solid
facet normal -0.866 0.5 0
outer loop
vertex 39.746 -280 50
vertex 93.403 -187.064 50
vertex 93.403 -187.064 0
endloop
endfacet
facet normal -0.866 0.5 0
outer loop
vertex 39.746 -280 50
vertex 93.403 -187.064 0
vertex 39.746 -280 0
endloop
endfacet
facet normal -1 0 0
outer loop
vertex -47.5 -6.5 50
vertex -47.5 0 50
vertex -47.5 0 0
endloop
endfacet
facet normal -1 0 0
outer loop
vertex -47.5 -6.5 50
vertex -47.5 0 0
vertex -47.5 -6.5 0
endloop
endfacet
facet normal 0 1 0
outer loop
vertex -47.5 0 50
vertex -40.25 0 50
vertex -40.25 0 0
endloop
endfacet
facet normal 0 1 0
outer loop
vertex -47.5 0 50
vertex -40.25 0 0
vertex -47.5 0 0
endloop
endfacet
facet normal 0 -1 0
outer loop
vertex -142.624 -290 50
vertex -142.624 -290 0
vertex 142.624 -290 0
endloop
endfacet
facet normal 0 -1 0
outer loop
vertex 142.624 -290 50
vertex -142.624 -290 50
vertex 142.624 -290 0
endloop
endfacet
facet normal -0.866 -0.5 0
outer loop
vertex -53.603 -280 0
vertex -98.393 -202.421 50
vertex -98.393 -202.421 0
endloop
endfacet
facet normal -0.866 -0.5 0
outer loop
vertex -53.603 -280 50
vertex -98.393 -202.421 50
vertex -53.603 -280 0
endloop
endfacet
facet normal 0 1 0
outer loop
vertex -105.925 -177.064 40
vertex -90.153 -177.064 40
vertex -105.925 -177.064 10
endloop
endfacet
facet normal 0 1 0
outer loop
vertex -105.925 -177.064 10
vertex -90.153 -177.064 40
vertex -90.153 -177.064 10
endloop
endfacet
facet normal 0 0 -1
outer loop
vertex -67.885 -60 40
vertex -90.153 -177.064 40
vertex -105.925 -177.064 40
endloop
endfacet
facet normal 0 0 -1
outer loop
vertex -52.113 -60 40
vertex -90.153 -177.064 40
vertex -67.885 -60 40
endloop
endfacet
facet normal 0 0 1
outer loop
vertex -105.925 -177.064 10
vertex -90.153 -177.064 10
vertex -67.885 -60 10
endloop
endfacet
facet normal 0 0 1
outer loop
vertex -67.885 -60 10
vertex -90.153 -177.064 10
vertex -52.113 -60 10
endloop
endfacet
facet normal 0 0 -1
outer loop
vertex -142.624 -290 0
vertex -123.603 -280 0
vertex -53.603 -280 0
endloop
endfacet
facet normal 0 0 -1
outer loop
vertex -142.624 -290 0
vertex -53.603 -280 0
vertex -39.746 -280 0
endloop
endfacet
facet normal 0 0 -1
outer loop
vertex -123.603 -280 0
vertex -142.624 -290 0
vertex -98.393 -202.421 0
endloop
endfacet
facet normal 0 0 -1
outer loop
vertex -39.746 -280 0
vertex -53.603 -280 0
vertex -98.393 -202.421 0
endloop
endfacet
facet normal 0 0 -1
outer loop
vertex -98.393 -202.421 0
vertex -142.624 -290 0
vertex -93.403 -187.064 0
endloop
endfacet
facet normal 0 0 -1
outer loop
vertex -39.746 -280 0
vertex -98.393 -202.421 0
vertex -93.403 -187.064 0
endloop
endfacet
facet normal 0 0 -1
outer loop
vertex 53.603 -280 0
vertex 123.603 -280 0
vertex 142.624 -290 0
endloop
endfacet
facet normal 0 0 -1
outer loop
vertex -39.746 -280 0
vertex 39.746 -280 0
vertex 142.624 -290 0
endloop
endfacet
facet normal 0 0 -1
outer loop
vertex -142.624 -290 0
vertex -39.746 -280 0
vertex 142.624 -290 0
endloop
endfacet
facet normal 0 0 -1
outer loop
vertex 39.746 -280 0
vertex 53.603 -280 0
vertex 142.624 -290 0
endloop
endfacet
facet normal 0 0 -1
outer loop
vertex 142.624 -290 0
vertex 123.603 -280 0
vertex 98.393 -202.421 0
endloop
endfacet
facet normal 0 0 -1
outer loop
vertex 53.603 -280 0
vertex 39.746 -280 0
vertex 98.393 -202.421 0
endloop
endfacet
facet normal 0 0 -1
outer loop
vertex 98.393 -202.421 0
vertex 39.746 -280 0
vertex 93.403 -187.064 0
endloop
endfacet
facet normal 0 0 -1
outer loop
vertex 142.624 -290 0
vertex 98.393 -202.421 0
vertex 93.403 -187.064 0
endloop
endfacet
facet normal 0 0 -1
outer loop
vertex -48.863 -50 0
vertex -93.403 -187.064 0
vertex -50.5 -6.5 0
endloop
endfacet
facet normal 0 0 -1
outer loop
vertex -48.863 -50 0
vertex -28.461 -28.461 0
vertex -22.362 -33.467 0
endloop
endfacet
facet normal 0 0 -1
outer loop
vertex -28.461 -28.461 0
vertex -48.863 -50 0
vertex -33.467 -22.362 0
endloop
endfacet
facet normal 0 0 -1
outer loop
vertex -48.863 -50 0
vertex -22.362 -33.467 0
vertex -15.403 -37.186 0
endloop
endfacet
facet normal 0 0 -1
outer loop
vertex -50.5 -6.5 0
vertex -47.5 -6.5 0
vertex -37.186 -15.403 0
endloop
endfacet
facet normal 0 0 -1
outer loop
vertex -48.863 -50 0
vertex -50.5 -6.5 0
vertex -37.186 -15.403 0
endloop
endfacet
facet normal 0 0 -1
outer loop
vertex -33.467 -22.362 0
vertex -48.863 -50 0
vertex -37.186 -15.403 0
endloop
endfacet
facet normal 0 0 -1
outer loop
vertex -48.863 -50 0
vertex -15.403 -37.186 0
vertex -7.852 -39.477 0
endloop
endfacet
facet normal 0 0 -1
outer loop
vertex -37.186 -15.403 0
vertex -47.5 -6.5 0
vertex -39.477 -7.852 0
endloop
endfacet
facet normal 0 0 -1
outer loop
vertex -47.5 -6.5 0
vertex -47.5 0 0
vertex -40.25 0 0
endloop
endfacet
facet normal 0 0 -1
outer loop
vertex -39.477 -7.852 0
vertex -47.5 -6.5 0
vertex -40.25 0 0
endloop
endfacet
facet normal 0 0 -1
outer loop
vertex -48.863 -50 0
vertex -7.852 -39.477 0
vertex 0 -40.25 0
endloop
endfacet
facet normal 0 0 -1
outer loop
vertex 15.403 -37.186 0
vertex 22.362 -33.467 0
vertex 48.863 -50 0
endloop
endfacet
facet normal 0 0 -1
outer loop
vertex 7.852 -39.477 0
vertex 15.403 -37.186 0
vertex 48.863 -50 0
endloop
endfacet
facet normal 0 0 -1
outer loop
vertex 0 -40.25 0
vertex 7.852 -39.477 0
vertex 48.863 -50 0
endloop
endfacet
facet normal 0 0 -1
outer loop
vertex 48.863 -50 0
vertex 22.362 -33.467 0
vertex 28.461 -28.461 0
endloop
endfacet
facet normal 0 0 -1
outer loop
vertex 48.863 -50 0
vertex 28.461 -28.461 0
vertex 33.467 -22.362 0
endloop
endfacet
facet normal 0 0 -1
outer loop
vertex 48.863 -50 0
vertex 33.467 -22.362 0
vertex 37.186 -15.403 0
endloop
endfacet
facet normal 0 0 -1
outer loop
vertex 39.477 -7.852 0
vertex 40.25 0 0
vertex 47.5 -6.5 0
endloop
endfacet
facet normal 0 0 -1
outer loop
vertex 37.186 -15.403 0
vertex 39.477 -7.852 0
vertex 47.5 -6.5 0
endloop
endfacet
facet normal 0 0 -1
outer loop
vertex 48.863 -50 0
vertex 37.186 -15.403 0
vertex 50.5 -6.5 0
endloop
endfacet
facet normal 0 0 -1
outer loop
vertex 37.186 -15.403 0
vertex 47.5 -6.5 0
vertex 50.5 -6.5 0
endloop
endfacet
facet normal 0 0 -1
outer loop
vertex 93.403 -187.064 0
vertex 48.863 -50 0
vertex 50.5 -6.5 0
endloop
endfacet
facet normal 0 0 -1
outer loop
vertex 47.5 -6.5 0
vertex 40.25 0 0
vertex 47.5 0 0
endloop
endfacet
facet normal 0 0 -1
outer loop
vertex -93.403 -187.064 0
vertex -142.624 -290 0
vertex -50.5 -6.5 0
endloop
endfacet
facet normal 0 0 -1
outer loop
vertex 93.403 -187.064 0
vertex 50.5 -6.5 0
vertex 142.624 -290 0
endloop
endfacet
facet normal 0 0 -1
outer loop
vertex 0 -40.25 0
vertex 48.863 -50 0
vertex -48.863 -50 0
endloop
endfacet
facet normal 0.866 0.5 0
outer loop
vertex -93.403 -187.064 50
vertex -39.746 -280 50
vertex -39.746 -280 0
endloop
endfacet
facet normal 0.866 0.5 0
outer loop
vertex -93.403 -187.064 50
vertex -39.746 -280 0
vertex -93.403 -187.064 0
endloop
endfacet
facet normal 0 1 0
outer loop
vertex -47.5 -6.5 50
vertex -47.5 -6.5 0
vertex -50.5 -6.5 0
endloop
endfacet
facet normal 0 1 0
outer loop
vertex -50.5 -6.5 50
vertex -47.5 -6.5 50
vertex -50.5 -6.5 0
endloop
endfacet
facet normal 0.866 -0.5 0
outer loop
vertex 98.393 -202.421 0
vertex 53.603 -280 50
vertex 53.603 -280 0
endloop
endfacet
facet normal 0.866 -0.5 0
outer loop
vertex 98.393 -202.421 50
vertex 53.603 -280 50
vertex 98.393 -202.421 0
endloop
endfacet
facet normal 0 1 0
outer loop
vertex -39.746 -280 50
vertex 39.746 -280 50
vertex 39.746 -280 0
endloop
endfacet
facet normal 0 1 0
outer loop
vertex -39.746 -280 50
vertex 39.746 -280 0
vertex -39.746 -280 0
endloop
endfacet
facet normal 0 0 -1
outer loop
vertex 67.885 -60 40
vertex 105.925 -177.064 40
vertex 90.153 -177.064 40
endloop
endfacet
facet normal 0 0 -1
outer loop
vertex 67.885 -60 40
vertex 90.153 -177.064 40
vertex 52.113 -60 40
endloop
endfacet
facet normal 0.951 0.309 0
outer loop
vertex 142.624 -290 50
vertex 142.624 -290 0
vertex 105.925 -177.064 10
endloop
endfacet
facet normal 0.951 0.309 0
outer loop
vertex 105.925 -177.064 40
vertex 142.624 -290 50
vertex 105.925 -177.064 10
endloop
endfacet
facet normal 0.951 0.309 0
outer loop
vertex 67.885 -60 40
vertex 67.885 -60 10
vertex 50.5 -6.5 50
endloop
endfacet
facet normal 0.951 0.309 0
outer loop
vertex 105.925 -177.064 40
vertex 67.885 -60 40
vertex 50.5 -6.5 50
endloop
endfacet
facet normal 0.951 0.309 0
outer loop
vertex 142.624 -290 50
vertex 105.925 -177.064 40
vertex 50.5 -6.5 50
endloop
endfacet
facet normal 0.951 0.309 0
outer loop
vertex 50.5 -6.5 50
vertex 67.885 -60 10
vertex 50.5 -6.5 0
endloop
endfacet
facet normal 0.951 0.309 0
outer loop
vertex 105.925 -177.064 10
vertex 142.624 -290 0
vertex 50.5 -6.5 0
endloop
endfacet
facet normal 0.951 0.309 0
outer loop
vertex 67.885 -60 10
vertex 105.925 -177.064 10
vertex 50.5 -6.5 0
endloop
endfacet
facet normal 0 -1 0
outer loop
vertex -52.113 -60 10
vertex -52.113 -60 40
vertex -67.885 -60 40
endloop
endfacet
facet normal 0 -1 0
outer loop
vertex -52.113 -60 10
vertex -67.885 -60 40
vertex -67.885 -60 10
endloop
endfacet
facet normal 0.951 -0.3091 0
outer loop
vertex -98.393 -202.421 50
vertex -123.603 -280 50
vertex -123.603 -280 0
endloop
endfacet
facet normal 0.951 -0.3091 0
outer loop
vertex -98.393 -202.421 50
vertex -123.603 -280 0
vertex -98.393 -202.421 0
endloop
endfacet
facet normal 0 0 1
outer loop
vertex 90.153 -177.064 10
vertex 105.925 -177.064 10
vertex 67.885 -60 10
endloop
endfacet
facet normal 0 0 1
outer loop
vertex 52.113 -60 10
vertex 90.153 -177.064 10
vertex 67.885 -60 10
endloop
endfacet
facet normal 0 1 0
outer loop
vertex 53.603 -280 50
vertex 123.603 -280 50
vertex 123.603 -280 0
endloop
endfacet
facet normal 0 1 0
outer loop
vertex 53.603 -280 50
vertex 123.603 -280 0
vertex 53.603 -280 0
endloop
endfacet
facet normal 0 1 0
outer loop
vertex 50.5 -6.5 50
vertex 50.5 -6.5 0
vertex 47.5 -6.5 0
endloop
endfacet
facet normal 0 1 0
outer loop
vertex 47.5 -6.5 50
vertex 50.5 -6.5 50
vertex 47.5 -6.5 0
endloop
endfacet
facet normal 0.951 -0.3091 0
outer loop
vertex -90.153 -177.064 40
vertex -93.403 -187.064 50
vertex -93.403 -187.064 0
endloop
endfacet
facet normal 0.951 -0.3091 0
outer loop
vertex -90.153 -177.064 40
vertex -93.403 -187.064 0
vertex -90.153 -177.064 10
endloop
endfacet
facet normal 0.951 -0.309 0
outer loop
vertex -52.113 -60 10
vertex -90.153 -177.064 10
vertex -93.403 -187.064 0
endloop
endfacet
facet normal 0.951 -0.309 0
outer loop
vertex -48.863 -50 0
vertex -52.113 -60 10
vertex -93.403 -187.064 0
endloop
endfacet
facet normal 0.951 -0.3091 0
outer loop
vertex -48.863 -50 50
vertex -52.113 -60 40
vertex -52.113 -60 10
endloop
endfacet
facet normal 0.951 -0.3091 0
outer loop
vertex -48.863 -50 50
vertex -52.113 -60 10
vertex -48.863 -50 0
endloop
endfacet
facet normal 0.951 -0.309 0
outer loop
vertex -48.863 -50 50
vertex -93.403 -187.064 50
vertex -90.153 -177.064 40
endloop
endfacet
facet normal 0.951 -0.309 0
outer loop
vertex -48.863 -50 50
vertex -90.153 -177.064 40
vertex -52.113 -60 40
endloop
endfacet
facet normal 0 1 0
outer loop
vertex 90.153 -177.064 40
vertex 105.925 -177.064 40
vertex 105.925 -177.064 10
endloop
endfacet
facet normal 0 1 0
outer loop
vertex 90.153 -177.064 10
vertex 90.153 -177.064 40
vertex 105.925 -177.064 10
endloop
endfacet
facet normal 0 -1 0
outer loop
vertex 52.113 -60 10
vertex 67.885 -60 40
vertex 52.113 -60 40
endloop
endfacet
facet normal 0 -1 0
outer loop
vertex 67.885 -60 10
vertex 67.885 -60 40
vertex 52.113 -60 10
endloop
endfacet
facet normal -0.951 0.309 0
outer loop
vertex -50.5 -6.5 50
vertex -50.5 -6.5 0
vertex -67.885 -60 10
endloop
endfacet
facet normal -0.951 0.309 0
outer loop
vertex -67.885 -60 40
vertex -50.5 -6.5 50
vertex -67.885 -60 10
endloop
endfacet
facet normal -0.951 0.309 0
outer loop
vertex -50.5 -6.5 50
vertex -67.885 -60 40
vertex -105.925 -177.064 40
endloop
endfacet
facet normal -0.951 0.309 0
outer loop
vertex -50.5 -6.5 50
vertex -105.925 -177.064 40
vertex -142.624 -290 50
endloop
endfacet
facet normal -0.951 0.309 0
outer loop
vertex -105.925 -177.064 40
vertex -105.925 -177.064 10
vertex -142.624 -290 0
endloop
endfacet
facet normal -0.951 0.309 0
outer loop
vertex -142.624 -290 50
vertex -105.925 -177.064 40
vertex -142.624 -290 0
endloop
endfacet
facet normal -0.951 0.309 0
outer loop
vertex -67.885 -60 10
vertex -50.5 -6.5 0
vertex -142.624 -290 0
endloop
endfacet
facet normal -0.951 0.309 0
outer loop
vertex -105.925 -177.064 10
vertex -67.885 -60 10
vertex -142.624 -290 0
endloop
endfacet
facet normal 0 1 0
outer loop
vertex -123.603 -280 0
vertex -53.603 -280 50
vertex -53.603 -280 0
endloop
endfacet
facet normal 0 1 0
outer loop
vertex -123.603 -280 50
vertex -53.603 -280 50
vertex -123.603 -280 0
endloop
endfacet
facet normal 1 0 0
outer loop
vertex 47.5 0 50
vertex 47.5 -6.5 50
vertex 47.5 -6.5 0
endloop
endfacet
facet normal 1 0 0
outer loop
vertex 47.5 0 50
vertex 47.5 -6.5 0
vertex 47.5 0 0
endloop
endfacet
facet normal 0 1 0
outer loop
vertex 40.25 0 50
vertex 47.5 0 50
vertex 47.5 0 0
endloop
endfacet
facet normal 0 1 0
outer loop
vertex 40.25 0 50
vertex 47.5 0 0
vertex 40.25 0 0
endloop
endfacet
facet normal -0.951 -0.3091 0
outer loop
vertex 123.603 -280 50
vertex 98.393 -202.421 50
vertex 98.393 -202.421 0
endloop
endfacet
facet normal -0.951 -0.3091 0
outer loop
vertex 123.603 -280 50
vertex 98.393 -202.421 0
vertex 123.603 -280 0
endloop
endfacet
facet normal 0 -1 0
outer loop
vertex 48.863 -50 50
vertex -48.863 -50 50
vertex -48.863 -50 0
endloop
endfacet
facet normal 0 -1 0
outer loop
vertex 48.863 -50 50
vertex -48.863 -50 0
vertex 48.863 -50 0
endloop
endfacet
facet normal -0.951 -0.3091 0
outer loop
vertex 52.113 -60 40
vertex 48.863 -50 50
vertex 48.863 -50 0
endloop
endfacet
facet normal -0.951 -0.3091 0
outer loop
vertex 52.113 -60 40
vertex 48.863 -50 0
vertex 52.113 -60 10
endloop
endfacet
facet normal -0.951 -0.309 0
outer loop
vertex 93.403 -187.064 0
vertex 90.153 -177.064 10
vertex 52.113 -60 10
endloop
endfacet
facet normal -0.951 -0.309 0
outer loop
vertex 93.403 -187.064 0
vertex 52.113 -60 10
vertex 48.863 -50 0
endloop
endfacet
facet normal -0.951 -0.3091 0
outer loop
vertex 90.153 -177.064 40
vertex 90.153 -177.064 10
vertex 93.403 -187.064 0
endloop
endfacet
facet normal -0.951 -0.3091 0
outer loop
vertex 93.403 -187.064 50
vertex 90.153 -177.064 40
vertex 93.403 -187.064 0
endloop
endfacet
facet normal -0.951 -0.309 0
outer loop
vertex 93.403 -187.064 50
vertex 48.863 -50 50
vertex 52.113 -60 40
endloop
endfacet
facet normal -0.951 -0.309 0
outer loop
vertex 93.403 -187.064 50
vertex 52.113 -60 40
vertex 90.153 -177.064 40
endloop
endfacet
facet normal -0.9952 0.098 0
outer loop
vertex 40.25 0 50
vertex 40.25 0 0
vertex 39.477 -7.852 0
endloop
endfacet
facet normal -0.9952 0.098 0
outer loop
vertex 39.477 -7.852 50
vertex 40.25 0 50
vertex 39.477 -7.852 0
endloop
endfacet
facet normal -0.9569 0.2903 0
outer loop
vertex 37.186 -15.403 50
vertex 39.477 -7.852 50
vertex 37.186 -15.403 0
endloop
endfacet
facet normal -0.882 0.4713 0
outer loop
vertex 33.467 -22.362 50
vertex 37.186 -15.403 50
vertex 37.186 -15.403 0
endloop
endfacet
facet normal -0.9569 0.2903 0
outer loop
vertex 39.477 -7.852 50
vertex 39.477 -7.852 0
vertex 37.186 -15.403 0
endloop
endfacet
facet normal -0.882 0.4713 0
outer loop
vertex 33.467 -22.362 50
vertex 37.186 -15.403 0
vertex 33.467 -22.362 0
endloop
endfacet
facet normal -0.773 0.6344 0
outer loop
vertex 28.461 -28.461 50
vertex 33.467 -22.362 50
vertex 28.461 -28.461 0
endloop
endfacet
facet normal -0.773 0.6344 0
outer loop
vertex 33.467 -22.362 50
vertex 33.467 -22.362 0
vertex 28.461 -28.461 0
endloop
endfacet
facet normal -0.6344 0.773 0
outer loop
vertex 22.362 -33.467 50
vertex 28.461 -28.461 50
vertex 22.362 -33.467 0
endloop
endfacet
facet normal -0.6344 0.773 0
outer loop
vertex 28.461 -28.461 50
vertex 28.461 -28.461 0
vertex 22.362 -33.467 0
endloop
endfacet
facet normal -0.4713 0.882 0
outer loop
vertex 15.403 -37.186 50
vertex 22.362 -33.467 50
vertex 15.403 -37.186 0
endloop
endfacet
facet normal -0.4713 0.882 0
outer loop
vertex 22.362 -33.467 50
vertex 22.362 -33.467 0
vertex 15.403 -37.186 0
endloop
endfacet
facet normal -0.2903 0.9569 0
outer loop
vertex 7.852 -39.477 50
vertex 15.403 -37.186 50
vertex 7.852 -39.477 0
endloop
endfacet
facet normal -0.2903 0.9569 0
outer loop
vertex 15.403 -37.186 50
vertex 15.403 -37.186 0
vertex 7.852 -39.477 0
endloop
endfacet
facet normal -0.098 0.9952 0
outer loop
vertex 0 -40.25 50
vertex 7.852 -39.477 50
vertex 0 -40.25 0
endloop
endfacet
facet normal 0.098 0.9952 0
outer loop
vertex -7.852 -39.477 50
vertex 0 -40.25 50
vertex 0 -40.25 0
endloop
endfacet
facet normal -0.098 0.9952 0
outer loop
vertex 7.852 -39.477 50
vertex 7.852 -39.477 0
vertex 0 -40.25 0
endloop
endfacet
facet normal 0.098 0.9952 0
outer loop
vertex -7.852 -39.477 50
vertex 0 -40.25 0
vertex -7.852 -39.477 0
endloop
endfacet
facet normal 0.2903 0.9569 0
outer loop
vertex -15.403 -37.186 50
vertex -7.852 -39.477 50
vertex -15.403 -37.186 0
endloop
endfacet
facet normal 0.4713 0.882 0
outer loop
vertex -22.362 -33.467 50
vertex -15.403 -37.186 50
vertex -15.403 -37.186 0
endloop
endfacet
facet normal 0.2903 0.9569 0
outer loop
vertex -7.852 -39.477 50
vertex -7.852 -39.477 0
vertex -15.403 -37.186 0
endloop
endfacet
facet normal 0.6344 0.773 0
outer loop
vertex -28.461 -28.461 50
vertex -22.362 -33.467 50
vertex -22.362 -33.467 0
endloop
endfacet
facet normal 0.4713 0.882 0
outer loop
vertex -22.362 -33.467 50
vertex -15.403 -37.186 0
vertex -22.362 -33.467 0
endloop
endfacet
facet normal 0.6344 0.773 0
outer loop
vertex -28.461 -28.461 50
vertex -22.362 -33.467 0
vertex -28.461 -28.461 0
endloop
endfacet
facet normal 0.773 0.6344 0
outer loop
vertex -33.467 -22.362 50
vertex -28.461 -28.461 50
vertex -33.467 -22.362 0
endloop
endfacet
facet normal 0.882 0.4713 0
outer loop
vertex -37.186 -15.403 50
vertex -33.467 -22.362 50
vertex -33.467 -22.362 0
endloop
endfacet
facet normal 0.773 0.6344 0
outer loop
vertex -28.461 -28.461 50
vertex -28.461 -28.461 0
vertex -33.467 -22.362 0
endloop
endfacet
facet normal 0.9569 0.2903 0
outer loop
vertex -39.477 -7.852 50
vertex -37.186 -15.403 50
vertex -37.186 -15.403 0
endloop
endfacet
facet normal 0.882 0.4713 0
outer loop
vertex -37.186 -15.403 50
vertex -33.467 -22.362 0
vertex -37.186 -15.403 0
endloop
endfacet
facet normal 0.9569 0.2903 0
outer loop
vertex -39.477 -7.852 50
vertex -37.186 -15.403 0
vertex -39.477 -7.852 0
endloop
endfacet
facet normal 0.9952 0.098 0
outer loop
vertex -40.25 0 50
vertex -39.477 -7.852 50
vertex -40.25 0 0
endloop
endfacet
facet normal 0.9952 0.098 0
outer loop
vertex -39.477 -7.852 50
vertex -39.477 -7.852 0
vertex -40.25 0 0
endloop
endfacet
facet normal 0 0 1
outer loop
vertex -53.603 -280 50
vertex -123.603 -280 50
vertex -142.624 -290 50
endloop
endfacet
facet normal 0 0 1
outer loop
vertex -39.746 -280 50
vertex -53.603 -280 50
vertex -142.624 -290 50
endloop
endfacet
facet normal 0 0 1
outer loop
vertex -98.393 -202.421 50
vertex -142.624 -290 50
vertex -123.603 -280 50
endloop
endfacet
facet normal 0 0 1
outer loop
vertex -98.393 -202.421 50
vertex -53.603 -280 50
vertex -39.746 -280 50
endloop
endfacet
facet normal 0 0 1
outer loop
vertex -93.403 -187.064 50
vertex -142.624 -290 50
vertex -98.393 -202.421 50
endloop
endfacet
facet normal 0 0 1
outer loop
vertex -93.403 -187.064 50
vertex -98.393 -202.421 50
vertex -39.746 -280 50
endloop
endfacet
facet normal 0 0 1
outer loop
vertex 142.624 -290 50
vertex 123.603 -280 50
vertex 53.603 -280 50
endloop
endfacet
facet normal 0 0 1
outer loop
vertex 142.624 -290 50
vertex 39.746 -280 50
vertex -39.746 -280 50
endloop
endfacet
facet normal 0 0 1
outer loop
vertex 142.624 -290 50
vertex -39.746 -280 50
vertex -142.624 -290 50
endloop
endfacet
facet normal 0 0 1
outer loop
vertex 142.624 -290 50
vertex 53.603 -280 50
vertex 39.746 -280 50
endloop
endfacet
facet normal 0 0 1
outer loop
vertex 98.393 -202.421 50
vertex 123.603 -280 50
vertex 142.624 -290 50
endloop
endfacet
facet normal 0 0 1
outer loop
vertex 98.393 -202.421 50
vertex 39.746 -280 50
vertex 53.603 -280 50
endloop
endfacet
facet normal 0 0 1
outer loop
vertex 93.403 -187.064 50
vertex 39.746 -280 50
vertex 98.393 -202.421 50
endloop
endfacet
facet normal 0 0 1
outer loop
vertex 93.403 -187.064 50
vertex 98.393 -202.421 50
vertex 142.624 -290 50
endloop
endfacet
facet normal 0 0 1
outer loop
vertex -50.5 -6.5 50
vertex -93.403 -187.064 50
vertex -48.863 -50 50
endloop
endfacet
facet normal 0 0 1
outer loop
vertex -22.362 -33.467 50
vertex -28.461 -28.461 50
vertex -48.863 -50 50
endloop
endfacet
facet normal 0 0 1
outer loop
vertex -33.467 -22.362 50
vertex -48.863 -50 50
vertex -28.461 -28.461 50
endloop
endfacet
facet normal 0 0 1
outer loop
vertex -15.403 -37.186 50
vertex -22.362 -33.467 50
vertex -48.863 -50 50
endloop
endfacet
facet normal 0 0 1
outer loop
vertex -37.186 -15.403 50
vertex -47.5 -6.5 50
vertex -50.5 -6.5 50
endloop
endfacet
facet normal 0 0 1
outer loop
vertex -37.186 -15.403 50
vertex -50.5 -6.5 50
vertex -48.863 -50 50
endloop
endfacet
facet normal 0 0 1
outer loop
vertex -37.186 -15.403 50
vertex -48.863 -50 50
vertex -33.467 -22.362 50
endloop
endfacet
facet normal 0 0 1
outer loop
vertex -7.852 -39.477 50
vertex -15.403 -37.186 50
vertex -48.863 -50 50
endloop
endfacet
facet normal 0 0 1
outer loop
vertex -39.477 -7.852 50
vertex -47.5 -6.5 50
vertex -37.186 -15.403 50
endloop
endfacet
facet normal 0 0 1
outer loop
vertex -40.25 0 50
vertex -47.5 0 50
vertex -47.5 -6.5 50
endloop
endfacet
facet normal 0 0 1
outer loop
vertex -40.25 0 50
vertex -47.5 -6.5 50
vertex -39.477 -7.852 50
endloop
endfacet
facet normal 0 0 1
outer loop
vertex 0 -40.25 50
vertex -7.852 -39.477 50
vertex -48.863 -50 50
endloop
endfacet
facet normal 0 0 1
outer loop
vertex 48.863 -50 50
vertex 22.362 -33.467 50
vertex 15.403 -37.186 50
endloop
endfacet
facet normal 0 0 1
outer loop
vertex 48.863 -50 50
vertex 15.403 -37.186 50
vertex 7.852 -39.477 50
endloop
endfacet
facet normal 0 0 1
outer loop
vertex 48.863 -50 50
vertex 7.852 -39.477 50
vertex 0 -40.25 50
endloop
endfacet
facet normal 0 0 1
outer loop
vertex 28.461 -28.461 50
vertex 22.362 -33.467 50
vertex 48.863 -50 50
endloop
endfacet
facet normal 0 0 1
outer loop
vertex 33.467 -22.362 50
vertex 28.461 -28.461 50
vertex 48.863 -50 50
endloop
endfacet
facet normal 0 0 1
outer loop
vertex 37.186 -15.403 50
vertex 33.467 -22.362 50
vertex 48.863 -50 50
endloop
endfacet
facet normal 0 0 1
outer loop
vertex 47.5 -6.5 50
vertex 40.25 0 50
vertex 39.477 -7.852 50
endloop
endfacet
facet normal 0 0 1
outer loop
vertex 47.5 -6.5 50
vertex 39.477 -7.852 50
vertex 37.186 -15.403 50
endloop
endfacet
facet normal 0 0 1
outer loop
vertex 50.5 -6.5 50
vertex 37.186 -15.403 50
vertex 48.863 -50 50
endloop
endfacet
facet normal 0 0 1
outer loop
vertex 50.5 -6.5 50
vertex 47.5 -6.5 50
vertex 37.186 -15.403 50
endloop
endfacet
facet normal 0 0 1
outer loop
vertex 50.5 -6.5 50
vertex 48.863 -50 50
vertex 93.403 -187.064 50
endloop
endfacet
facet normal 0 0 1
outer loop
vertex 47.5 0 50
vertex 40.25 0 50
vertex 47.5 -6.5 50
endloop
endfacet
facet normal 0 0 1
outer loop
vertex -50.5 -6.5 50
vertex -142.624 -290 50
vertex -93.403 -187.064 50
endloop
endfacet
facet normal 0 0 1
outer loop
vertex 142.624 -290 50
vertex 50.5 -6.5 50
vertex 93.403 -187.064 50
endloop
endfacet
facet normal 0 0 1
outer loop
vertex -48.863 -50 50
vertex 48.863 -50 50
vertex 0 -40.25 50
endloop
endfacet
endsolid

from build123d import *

# Parameters (mm, degrees)
BOSS_EXTRUDE1_DEPTH     = 50
CUT_EXTRUDE1_DEPTH      = 80
SKETCH4_W               = 30
SKETCH4_H               = 117.064102809
CUT_EXTRUDE2_DEPTH      = 11.624305452
CUT_EXTRUDE2_DEPTH_BACK = 260


with BuildPart() as part:
    # Sketch1 → Boss-Extrude1 (new body)
    with BuildSketch(Plane.XY):
        with BuildLine():
            Line((-40.25, 0), (-47.5, 0))
            Line((-47.5, 0), (-47.5, -6.5))
            Line((-47.5, -6.5), (-50.5, -6.5))
            Line((-50.5, -6.5), (-142.624305452, -290))
            Line((-142.624305452, -290), (142.624305452, -290))
            Line((142.624305452, -290), (50.5, -6.5))
            Line((50.5, -6.5), (47.5, -6.5))
            Line((47.5, -6.5), (47.5, 0))
            Line((47.5, 0), (40.25, 0))
            ThreePointArc((40.25, 0), (0, -40.25), (-40.25, 0))
        make_face()
    extrude(amount=BOSS_EXTRUDE1_DEPTH)

    # Sketch2 → Cut-Extrude1 (cut)
    with BuildSketch(Plane.XY.offset(50)):
        Polygon((-123.602681001, -280), (-98.393052146, -202.420801488), (-53.602681001, -280), align=None)
        Polygon((48.863385573, -50), (93.402839801, -187.064102809), (39.746274541, -280), (-39.746274541, -280), (-93.402839801, -187.064102809), (-48.863385573, -50), align=None)
        Polygon((123.602681001, -280), (53.602681001, -280), (98.393052146, -202.420801488), align=None)
    extrude(amount=-CUT_EXTRUDE1_DEPTH, mode=Mode.SUBTRACT)

    # Sketch4 → Cut-Extrude2 (cut, two sides)
    with BuildSketch(Plane(origin=(132, 0, 0), x_dir=(0, 0, -1), z_dir=(1, 0, 0))) as cut_extrude2_sk:
        with Locations((-25, -118.532051405)):
            Rectangle(SKETCH4_W, SKETCH4_H)
    extrude(amount=CUT_EXTRUDE2_DEPTH, mode=Mode.SUBTRACT)
    extrude(cut_extrude2_sk.sketch, amount=-CUT_EXTRUDE2_DEPTH_BACK, mode=Mode.SUBTRACT)


solid = part.part
